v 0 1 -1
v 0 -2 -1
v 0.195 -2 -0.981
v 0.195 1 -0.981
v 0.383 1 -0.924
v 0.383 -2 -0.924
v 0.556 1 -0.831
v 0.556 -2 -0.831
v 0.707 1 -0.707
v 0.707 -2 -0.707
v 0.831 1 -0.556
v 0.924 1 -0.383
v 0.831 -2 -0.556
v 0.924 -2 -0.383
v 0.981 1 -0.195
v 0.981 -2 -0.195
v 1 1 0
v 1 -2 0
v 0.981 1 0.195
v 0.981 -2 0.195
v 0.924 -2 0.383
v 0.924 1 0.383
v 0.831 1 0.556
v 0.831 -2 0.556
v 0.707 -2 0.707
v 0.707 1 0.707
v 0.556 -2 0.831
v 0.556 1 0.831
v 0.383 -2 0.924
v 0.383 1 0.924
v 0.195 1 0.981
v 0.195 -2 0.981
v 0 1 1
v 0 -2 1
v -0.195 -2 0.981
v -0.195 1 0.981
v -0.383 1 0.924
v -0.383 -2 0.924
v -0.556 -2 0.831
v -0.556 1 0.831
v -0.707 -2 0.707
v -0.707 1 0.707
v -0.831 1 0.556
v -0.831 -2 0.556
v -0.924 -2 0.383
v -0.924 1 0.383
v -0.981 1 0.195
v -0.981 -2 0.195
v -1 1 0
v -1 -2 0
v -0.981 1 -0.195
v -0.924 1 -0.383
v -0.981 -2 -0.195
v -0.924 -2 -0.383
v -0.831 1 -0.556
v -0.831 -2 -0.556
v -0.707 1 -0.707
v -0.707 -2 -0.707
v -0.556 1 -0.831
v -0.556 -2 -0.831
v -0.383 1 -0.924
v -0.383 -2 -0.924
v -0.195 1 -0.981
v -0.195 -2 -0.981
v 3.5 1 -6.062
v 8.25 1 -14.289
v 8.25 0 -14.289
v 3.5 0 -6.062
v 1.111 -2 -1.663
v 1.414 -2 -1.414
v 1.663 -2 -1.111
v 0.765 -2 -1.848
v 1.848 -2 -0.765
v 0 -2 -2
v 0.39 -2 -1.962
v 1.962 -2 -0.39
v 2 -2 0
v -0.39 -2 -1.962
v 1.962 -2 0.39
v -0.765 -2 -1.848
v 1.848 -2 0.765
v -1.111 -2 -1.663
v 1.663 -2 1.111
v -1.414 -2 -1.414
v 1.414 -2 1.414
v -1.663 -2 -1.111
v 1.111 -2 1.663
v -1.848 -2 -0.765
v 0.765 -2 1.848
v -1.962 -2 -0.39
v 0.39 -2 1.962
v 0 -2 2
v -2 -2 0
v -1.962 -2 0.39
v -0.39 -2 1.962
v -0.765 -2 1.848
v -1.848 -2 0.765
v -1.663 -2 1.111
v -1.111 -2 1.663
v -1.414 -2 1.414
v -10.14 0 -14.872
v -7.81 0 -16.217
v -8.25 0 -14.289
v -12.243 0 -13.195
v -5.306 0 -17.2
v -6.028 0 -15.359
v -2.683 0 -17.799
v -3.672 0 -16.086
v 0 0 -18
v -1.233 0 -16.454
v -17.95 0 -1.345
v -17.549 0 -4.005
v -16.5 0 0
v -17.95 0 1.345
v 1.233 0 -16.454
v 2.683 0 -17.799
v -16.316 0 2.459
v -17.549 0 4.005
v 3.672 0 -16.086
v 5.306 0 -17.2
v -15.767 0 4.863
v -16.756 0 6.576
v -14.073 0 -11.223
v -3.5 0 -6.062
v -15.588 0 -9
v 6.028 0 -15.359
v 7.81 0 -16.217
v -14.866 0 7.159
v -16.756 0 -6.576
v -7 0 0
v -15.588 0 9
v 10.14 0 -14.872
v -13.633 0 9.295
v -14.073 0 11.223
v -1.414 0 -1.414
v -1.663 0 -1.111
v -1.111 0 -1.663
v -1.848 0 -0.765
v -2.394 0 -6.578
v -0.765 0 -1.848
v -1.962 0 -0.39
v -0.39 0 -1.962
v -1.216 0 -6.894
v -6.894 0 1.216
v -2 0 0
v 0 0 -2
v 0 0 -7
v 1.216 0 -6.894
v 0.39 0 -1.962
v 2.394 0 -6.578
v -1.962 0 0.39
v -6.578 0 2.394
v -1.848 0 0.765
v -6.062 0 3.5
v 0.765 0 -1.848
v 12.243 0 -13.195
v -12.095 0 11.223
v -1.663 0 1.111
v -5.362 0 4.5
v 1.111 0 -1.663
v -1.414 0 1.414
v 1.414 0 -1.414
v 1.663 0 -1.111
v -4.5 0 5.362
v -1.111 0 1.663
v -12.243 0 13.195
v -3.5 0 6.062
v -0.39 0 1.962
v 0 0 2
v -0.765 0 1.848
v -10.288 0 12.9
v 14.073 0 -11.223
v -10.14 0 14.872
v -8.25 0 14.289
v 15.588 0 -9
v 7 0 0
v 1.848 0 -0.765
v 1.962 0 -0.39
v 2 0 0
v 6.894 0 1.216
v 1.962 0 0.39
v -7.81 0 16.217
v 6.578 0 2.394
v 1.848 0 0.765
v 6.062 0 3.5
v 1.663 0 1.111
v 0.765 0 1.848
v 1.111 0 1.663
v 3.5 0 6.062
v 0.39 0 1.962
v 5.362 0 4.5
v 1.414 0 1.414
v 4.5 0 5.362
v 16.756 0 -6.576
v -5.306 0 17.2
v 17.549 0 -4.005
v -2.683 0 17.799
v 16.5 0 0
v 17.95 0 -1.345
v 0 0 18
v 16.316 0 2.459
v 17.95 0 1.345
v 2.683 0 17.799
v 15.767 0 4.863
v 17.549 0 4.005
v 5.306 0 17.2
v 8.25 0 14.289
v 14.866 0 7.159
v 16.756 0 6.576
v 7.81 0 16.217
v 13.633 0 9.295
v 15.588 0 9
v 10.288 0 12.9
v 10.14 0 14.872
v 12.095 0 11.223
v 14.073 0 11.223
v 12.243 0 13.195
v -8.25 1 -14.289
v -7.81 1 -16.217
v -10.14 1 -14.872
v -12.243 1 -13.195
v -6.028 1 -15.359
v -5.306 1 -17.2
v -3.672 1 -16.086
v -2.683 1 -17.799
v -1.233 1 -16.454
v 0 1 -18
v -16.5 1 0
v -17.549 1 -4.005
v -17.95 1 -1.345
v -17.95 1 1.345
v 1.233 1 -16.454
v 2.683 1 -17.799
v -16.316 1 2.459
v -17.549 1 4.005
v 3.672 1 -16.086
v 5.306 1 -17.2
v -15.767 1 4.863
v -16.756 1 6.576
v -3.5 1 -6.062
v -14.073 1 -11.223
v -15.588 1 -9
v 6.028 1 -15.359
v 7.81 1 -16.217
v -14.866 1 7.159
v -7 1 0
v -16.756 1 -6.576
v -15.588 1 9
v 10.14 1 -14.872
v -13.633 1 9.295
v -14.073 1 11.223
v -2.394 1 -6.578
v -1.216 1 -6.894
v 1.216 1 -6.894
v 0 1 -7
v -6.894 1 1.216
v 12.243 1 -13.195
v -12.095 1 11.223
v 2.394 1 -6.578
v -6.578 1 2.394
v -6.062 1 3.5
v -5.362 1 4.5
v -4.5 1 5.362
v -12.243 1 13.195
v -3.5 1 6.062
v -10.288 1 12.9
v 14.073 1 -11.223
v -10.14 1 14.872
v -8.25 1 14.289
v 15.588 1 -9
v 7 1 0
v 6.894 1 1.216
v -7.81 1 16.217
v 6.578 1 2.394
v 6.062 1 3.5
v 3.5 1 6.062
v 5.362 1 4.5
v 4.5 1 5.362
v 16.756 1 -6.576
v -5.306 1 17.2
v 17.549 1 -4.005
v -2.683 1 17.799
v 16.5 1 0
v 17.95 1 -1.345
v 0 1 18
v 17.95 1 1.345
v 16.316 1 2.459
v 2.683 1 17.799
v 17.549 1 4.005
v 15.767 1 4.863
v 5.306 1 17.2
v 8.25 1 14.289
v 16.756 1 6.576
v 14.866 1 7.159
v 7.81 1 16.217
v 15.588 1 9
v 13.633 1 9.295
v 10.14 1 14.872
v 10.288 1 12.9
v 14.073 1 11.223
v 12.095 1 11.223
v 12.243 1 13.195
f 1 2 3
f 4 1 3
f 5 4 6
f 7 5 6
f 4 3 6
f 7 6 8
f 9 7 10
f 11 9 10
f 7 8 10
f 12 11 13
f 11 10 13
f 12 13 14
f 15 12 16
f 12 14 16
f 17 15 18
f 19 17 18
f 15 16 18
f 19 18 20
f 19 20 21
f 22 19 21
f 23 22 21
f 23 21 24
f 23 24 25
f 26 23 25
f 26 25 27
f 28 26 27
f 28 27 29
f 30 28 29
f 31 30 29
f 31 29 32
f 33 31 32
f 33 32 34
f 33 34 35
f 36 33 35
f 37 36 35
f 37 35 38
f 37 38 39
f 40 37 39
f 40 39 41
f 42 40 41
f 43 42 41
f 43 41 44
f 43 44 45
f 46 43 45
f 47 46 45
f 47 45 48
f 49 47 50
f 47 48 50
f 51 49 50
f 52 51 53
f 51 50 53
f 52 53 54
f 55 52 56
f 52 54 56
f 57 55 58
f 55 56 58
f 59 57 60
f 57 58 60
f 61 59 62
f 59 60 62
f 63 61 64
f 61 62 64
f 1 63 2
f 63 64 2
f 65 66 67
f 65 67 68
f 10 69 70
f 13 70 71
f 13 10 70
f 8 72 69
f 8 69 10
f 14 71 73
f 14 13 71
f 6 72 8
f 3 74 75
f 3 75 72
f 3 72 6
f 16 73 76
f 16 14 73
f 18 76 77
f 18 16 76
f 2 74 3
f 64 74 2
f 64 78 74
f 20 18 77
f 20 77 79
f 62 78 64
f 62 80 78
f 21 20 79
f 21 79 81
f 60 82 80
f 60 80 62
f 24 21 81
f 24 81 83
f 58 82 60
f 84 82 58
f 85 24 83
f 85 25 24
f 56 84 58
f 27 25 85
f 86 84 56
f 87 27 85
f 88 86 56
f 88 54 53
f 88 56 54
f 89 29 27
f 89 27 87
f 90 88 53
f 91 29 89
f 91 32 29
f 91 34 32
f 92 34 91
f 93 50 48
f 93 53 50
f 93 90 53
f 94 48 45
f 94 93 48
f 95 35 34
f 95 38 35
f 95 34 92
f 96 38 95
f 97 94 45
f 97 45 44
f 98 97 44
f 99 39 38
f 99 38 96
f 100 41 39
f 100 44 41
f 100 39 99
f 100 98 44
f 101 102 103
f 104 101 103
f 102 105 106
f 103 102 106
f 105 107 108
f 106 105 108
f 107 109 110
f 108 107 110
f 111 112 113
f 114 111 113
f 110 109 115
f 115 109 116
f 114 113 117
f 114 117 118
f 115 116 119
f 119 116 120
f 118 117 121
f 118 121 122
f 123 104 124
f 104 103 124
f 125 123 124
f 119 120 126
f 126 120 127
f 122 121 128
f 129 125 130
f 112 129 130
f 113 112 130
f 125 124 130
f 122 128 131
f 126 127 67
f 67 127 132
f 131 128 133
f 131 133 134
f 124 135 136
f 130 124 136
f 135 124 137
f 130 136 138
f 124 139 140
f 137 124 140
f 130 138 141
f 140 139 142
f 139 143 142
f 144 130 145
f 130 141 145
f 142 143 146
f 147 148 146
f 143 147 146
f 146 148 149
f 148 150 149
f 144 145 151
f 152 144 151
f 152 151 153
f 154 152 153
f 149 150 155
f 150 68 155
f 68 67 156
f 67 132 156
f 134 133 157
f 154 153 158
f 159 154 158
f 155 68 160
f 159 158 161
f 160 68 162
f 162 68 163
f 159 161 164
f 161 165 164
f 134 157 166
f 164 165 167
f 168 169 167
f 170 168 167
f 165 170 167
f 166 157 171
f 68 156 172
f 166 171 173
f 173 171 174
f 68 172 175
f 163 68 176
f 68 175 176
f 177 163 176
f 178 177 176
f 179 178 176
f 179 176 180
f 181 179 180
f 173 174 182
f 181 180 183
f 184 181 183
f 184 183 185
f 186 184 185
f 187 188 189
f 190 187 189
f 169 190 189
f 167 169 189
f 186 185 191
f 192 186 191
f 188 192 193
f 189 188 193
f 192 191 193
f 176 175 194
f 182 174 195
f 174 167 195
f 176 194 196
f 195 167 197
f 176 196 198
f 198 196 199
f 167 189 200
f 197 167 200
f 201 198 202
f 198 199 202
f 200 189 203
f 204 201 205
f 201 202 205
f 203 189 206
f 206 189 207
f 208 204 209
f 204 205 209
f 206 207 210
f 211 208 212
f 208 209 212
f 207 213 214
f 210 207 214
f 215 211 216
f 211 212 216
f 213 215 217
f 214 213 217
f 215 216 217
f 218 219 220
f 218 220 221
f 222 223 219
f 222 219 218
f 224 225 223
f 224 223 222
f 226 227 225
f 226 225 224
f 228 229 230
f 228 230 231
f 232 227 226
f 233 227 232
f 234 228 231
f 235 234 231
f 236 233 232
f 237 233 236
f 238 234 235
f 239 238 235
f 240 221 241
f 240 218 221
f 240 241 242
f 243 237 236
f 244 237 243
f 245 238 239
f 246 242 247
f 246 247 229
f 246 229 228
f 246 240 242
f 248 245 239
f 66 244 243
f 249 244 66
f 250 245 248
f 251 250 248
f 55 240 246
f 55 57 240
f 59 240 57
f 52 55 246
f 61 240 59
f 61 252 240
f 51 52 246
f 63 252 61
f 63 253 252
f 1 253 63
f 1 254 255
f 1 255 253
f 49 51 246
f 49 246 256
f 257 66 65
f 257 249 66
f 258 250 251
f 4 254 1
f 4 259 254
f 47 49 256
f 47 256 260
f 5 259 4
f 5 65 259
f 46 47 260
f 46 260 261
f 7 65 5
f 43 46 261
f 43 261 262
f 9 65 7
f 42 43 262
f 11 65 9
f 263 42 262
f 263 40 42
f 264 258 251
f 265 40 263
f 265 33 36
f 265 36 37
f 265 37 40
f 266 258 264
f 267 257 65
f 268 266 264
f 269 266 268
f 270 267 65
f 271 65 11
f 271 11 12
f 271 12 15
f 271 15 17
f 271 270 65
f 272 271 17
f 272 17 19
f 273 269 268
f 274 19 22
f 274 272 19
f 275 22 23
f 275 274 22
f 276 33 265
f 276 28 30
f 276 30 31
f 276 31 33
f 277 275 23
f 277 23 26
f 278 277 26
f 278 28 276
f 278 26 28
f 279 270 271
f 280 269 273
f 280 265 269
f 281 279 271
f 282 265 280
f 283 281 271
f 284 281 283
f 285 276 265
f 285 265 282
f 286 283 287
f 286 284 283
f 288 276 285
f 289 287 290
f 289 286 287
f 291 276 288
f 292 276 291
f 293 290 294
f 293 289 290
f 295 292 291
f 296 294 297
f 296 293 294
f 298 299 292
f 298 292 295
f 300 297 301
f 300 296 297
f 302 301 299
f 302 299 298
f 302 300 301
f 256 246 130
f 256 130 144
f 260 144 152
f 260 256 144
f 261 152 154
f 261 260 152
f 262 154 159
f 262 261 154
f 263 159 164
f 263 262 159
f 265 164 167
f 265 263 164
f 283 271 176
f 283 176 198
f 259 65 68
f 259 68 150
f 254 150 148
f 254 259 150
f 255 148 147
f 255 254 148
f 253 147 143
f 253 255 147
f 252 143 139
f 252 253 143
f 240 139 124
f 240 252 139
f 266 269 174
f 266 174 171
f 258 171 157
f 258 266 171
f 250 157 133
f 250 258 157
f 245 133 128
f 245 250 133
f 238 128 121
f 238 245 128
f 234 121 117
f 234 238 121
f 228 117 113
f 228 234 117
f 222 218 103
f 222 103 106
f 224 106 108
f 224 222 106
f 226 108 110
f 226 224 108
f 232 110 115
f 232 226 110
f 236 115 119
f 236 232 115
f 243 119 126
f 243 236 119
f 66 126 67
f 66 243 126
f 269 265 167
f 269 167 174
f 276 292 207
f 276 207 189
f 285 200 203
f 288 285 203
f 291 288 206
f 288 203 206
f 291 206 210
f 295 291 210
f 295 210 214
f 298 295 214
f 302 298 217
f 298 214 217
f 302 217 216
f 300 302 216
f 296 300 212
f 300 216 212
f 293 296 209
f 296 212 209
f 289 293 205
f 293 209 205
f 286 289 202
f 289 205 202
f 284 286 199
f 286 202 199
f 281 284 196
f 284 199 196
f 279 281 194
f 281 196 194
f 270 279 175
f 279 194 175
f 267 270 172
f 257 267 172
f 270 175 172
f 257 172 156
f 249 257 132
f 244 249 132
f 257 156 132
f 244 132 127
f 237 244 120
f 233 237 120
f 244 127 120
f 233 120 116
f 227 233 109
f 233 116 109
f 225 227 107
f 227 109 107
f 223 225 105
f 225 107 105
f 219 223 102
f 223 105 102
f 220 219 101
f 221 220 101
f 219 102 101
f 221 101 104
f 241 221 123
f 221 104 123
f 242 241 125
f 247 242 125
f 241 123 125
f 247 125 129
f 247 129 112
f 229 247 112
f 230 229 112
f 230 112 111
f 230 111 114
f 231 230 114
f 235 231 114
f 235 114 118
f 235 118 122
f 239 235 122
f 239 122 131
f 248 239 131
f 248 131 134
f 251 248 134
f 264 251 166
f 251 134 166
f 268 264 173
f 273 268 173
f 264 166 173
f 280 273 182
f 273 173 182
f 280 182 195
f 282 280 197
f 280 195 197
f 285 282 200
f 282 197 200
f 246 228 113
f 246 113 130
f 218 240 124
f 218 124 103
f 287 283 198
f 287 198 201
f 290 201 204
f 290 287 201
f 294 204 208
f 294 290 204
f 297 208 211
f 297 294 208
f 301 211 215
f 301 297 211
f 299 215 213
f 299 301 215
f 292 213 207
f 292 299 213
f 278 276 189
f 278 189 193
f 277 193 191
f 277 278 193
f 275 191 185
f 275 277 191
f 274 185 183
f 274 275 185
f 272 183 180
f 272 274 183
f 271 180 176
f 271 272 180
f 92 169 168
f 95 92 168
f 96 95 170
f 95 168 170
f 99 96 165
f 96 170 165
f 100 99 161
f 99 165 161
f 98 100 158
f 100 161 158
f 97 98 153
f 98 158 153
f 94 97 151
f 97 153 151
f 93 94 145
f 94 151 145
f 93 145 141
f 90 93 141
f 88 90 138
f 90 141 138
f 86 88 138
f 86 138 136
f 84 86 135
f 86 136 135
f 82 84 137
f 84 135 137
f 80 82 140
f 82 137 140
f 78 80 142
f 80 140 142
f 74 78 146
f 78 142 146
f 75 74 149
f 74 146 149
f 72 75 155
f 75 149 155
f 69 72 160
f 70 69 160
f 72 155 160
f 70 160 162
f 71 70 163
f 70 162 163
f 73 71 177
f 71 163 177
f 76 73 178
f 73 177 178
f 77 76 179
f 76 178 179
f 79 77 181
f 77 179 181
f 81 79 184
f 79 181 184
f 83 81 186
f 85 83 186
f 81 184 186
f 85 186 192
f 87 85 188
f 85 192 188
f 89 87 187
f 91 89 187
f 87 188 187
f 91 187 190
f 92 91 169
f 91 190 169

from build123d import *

# Parameters (mm, degrees)
SKETCH1_R           = 18
BOSS_EXTRUDE1_DEPTH = 1
SKETCH2_R           = 2
BOSS_EXTRUDE2_DEPTH = 2
SKETCH3_R           = 1
CUT_EXTRUDE1_DEPTH  = 26.632011236
CUT_EXTRUDE2_REACH  = 27.632


with BuildPart() as part:
    # Sketch1 → Boss-Extrude1 (new body)
    with BuildSketch(Plane(origin=(0, 0, 0), x_dir=(1, 0, 0), z_dir=(0, 1, 0))):
        with Locations(Location((0, 0, 0), (0, 0, 270))):
            Circle(SKETCH1_R)
    extrude(amount=BOSS_EXTRUDE1_DEPTH)

    # Sketch2 → Boss-Extrude2 (add)
    with BuildSketch(Plane.XZ):
        with Locations(Location((0, 0, 0), (0, 0, 90))):
            Circle(SKETCH2_R)
    extrude(amount=BOSS_EXTRUDE2_DEPTH)

    # Sketch3 → Cut-Extrude1 (cut, through all)
    with BuildSketch(Plane.XZ.offset(2)):
        with Locations(Location((0, 0, 0), (0, 0, 270))):
            Circle(SKETCH3_R)
    extrude(amount=-CUT_EXTRUDE1_DEPTH, mode=Mode.SUBTRACT)

    # Sketch4 → Cut-Extrude2 (cut, up to next)
    with BuildSketch(Plane(origin=(0, 1, 0), x_dir=(1, 0, 0), z_dir=(0, 1, 0)), mode=Mode.PRIVATE) as cut_extrude2_sk1:
        with BuildLine():
            Line((-3.5, 6.062177826), (-8.25, 14.289419162))
            ThreePointArc((-8.25, 14.289419162), (0, 16.5), (8.25, 14.289419162))
            Line((8.25, 14.289419162), (3.5, 6.062177826))
            ThreePointArc((3.5, 6.062177826), (0, 7), (-3.5, 6.062177826))
        make_face()
    cut_extrude2_tool1 = extrude(cut_extrude2_sk1.sketch, amount=-CUT_EXTRUDE2_REACH, mode=Mode.PRIVATE) & part.part
    # Sketch4 → Cut-Extrude2 (cut, up to next)
    with BuildSketch(Plane(origin=(0, 1, 0), x_dir=(1, 0, 0), z_dir=(0, 1, 0)), mode=Mode.PRIVATE) as cut_extrude2_sk2:
        with BuildLine():
            Line((7, 0), (16.5, 0))
            ThreePointArc((16.5, 0), (14.289419162, -8.25), (8.25, -14.289419162))
            Line((8.25, -14.289419162), (3.5, -6.062177826))
            ThreePointArc((3.5, -6.062177826), (6.062177826, -3.5), (7, 0))
        make_face()
    cut_extrude2_tool2 = extrude(cut_extrude2_sk2.sketch, amount=-CUT_EXTRUDE2_REACH, mode=Mode.PRIVATE) & part.part
    # Sketch4 → Cut-Extrude2 (cut, up to next)
    with BuildSketch(Plane(origin=(0, 1, 0), x_dir=(1, 0, 0), z_dir=(0, 1, 0)), mode=Mode.PRIVATE) as cut_extrude2_sk3:
        with BuildLine():
            Line((-3.5, -6.062177826), (-8.25, -14.289419162))
            ThreePointArc((-8.25, -14.289419162), (-14.289419162, -8.25), (-16.5, 0))
            Line((-16.5, 0), (-7, 0))
            ThreePointArc((-7, 0), (-6.062177826, -3.5), (-3.5, -6.062177826))
        make_face()
    cut_extrude2_tool3 = extrude(cut_extrude2_sk3.sketch, amount=-CUT_EXTRUDE2_REACH, mode=Mode.PRIVATE) & part.part
    add(cut_extrude2_tool1.solids().sort_by_distance((0, 1, -11.831646))[0], mode=Mode.SUBTRACT)
    add(cut_extrude2_tool2.solids().sort_by_distance((10.246506, 1, 5.915823))[0], mode=Mode.SUBTRACT)
    add(cut_extrude2_tool3.solids().sort_by_distance((-10.246506, 1, 5.915823))[0], mode=Mode.SUBTRACT)


solid = part.part
